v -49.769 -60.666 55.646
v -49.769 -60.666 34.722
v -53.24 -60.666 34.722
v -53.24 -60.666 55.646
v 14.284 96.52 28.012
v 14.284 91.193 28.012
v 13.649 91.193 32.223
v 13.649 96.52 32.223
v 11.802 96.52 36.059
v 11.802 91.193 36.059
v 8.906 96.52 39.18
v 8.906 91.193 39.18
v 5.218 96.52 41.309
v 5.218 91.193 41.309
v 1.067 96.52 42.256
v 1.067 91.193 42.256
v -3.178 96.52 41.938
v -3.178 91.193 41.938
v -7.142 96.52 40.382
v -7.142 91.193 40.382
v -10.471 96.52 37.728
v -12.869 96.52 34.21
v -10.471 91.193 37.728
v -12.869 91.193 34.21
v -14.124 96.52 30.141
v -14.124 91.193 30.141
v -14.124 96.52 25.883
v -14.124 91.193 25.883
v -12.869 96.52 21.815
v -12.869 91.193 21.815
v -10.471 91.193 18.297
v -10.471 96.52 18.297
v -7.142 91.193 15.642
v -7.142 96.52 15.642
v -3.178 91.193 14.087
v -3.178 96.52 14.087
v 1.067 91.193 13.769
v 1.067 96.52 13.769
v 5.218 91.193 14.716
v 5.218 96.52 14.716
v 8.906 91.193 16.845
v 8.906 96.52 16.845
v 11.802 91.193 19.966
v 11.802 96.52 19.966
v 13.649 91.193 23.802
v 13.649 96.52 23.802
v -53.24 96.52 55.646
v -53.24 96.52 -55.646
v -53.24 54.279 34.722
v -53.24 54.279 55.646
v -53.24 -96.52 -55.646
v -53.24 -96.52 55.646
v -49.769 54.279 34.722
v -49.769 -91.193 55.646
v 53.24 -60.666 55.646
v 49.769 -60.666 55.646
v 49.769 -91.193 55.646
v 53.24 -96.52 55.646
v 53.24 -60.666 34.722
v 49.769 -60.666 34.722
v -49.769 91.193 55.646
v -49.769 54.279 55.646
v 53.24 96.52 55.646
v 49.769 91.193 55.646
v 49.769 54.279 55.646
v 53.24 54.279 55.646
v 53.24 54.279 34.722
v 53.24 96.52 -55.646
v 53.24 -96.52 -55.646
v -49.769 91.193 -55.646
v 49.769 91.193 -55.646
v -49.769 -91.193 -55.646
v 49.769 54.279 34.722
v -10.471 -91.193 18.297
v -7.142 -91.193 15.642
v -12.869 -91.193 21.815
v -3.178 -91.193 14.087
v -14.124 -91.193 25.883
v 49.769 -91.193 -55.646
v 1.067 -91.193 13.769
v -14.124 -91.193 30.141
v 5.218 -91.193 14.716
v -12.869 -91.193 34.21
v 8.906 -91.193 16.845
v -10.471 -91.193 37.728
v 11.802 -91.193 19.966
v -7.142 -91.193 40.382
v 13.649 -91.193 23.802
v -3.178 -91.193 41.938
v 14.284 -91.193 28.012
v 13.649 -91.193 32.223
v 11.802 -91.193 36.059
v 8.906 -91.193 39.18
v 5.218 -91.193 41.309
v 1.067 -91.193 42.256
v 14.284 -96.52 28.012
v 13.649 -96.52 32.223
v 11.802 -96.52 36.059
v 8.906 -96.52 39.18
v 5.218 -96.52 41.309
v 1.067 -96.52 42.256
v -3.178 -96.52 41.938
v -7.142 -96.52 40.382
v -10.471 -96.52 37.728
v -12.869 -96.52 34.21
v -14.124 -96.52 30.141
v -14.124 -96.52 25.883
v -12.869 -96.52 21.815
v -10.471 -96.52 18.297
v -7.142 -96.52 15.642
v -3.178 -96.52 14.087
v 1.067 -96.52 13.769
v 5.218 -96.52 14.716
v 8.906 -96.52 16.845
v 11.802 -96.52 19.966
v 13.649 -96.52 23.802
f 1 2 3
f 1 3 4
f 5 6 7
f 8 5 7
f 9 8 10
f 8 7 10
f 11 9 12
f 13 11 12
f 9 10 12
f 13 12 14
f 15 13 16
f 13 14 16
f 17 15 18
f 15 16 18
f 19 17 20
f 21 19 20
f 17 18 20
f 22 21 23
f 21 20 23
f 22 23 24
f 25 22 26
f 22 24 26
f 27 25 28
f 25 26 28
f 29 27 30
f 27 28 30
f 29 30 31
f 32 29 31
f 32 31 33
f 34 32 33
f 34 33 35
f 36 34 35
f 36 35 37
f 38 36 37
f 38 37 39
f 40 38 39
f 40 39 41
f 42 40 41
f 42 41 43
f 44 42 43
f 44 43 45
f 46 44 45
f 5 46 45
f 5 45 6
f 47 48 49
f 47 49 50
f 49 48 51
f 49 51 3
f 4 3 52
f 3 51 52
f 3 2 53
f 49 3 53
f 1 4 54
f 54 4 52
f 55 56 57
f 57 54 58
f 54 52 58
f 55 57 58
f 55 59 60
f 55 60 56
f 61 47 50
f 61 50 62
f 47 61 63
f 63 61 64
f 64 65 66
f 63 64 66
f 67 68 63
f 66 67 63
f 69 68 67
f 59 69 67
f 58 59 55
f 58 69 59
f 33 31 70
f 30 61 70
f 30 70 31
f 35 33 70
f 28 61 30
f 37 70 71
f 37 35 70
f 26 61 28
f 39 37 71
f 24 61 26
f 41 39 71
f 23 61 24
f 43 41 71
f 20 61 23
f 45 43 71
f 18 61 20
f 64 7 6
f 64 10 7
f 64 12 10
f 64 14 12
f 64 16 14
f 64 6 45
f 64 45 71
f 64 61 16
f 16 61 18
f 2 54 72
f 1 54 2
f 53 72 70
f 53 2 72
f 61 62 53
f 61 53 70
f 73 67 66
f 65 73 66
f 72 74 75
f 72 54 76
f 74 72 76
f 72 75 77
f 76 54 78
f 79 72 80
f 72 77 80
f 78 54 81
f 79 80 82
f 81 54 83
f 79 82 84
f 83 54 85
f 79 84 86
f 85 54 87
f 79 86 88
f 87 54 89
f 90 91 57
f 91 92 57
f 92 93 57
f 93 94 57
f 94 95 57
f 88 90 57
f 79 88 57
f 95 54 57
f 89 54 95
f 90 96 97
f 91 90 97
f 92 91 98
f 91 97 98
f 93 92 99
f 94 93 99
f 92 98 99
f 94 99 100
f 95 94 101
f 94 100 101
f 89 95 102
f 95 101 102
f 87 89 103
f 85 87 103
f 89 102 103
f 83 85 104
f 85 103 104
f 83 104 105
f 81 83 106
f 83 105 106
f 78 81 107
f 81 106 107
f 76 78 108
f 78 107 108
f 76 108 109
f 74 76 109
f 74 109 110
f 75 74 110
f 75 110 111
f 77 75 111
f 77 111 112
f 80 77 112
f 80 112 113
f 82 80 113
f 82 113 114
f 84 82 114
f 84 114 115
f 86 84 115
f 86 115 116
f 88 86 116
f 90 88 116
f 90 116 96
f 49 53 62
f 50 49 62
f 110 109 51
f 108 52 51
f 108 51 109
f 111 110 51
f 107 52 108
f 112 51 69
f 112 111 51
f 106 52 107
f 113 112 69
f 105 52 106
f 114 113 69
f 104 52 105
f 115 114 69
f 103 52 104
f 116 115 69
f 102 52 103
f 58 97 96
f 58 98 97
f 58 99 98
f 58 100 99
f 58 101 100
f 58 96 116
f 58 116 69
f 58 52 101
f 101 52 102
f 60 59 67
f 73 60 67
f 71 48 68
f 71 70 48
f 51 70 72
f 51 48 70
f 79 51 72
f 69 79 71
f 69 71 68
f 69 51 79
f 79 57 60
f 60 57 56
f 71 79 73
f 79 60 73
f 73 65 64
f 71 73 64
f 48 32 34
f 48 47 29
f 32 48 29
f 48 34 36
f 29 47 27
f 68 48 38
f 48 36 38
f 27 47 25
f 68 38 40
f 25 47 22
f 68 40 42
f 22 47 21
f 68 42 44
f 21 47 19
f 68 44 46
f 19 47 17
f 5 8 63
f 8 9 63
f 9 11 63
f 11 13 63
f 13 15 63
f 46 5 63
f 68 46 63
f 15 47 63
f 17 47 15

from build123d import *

# Parameters (mm, degrees)
F0_W     = 106.479474
F0_H     = 111.292108
F1_DEPTH = 96.52
F2_W     = 99.53875
F2_H     = 182.38613
F3_DEPTH = 181.356
F4_W     = 114.944555
F4_H     = 20.924191
F5_DEPTH = 135.128
F6_R     = 14.283712
F7_DEPTH = 257.302


with BuildPart() as f1:
    # F0 (on Front) → F1 (new body, symmetric)
    with BuildSketch(Plane.XZ):
        Rectangle(F0_W, F0_H)
    extrude(amount=F1_DEPTH, both=True)

    # F2 (on face) → F3 (cut)
    with BuildSketch(Plane.XY.offset(55.646054)):
        Rectangle(F2_W, F2_H)
    extrude(amount=-F3_DEPTH, mode=Mode.SUBTRACT)

    # F4 (on face) → F5 (cut)
    with BuildSketch(Plane.YZ.offset(53.239737)):
        with Locations((-3.193539, 45.183959)):
            Rectangle(F4_W, F4_H)
    extrude(amount=-F5_DEPTH, mode=Mode.SUBTRACT)

    # F6 (on face) → F7 (cut)
    with BuildSketch(Plane.XZ.offset(96.52)):
        with Locations((0, 28.012339)):
            Circle(F6_R)
    extrude(amount=-F7_DEPTH, mode=Mode.SUBTRACT)


solid = f1.part
